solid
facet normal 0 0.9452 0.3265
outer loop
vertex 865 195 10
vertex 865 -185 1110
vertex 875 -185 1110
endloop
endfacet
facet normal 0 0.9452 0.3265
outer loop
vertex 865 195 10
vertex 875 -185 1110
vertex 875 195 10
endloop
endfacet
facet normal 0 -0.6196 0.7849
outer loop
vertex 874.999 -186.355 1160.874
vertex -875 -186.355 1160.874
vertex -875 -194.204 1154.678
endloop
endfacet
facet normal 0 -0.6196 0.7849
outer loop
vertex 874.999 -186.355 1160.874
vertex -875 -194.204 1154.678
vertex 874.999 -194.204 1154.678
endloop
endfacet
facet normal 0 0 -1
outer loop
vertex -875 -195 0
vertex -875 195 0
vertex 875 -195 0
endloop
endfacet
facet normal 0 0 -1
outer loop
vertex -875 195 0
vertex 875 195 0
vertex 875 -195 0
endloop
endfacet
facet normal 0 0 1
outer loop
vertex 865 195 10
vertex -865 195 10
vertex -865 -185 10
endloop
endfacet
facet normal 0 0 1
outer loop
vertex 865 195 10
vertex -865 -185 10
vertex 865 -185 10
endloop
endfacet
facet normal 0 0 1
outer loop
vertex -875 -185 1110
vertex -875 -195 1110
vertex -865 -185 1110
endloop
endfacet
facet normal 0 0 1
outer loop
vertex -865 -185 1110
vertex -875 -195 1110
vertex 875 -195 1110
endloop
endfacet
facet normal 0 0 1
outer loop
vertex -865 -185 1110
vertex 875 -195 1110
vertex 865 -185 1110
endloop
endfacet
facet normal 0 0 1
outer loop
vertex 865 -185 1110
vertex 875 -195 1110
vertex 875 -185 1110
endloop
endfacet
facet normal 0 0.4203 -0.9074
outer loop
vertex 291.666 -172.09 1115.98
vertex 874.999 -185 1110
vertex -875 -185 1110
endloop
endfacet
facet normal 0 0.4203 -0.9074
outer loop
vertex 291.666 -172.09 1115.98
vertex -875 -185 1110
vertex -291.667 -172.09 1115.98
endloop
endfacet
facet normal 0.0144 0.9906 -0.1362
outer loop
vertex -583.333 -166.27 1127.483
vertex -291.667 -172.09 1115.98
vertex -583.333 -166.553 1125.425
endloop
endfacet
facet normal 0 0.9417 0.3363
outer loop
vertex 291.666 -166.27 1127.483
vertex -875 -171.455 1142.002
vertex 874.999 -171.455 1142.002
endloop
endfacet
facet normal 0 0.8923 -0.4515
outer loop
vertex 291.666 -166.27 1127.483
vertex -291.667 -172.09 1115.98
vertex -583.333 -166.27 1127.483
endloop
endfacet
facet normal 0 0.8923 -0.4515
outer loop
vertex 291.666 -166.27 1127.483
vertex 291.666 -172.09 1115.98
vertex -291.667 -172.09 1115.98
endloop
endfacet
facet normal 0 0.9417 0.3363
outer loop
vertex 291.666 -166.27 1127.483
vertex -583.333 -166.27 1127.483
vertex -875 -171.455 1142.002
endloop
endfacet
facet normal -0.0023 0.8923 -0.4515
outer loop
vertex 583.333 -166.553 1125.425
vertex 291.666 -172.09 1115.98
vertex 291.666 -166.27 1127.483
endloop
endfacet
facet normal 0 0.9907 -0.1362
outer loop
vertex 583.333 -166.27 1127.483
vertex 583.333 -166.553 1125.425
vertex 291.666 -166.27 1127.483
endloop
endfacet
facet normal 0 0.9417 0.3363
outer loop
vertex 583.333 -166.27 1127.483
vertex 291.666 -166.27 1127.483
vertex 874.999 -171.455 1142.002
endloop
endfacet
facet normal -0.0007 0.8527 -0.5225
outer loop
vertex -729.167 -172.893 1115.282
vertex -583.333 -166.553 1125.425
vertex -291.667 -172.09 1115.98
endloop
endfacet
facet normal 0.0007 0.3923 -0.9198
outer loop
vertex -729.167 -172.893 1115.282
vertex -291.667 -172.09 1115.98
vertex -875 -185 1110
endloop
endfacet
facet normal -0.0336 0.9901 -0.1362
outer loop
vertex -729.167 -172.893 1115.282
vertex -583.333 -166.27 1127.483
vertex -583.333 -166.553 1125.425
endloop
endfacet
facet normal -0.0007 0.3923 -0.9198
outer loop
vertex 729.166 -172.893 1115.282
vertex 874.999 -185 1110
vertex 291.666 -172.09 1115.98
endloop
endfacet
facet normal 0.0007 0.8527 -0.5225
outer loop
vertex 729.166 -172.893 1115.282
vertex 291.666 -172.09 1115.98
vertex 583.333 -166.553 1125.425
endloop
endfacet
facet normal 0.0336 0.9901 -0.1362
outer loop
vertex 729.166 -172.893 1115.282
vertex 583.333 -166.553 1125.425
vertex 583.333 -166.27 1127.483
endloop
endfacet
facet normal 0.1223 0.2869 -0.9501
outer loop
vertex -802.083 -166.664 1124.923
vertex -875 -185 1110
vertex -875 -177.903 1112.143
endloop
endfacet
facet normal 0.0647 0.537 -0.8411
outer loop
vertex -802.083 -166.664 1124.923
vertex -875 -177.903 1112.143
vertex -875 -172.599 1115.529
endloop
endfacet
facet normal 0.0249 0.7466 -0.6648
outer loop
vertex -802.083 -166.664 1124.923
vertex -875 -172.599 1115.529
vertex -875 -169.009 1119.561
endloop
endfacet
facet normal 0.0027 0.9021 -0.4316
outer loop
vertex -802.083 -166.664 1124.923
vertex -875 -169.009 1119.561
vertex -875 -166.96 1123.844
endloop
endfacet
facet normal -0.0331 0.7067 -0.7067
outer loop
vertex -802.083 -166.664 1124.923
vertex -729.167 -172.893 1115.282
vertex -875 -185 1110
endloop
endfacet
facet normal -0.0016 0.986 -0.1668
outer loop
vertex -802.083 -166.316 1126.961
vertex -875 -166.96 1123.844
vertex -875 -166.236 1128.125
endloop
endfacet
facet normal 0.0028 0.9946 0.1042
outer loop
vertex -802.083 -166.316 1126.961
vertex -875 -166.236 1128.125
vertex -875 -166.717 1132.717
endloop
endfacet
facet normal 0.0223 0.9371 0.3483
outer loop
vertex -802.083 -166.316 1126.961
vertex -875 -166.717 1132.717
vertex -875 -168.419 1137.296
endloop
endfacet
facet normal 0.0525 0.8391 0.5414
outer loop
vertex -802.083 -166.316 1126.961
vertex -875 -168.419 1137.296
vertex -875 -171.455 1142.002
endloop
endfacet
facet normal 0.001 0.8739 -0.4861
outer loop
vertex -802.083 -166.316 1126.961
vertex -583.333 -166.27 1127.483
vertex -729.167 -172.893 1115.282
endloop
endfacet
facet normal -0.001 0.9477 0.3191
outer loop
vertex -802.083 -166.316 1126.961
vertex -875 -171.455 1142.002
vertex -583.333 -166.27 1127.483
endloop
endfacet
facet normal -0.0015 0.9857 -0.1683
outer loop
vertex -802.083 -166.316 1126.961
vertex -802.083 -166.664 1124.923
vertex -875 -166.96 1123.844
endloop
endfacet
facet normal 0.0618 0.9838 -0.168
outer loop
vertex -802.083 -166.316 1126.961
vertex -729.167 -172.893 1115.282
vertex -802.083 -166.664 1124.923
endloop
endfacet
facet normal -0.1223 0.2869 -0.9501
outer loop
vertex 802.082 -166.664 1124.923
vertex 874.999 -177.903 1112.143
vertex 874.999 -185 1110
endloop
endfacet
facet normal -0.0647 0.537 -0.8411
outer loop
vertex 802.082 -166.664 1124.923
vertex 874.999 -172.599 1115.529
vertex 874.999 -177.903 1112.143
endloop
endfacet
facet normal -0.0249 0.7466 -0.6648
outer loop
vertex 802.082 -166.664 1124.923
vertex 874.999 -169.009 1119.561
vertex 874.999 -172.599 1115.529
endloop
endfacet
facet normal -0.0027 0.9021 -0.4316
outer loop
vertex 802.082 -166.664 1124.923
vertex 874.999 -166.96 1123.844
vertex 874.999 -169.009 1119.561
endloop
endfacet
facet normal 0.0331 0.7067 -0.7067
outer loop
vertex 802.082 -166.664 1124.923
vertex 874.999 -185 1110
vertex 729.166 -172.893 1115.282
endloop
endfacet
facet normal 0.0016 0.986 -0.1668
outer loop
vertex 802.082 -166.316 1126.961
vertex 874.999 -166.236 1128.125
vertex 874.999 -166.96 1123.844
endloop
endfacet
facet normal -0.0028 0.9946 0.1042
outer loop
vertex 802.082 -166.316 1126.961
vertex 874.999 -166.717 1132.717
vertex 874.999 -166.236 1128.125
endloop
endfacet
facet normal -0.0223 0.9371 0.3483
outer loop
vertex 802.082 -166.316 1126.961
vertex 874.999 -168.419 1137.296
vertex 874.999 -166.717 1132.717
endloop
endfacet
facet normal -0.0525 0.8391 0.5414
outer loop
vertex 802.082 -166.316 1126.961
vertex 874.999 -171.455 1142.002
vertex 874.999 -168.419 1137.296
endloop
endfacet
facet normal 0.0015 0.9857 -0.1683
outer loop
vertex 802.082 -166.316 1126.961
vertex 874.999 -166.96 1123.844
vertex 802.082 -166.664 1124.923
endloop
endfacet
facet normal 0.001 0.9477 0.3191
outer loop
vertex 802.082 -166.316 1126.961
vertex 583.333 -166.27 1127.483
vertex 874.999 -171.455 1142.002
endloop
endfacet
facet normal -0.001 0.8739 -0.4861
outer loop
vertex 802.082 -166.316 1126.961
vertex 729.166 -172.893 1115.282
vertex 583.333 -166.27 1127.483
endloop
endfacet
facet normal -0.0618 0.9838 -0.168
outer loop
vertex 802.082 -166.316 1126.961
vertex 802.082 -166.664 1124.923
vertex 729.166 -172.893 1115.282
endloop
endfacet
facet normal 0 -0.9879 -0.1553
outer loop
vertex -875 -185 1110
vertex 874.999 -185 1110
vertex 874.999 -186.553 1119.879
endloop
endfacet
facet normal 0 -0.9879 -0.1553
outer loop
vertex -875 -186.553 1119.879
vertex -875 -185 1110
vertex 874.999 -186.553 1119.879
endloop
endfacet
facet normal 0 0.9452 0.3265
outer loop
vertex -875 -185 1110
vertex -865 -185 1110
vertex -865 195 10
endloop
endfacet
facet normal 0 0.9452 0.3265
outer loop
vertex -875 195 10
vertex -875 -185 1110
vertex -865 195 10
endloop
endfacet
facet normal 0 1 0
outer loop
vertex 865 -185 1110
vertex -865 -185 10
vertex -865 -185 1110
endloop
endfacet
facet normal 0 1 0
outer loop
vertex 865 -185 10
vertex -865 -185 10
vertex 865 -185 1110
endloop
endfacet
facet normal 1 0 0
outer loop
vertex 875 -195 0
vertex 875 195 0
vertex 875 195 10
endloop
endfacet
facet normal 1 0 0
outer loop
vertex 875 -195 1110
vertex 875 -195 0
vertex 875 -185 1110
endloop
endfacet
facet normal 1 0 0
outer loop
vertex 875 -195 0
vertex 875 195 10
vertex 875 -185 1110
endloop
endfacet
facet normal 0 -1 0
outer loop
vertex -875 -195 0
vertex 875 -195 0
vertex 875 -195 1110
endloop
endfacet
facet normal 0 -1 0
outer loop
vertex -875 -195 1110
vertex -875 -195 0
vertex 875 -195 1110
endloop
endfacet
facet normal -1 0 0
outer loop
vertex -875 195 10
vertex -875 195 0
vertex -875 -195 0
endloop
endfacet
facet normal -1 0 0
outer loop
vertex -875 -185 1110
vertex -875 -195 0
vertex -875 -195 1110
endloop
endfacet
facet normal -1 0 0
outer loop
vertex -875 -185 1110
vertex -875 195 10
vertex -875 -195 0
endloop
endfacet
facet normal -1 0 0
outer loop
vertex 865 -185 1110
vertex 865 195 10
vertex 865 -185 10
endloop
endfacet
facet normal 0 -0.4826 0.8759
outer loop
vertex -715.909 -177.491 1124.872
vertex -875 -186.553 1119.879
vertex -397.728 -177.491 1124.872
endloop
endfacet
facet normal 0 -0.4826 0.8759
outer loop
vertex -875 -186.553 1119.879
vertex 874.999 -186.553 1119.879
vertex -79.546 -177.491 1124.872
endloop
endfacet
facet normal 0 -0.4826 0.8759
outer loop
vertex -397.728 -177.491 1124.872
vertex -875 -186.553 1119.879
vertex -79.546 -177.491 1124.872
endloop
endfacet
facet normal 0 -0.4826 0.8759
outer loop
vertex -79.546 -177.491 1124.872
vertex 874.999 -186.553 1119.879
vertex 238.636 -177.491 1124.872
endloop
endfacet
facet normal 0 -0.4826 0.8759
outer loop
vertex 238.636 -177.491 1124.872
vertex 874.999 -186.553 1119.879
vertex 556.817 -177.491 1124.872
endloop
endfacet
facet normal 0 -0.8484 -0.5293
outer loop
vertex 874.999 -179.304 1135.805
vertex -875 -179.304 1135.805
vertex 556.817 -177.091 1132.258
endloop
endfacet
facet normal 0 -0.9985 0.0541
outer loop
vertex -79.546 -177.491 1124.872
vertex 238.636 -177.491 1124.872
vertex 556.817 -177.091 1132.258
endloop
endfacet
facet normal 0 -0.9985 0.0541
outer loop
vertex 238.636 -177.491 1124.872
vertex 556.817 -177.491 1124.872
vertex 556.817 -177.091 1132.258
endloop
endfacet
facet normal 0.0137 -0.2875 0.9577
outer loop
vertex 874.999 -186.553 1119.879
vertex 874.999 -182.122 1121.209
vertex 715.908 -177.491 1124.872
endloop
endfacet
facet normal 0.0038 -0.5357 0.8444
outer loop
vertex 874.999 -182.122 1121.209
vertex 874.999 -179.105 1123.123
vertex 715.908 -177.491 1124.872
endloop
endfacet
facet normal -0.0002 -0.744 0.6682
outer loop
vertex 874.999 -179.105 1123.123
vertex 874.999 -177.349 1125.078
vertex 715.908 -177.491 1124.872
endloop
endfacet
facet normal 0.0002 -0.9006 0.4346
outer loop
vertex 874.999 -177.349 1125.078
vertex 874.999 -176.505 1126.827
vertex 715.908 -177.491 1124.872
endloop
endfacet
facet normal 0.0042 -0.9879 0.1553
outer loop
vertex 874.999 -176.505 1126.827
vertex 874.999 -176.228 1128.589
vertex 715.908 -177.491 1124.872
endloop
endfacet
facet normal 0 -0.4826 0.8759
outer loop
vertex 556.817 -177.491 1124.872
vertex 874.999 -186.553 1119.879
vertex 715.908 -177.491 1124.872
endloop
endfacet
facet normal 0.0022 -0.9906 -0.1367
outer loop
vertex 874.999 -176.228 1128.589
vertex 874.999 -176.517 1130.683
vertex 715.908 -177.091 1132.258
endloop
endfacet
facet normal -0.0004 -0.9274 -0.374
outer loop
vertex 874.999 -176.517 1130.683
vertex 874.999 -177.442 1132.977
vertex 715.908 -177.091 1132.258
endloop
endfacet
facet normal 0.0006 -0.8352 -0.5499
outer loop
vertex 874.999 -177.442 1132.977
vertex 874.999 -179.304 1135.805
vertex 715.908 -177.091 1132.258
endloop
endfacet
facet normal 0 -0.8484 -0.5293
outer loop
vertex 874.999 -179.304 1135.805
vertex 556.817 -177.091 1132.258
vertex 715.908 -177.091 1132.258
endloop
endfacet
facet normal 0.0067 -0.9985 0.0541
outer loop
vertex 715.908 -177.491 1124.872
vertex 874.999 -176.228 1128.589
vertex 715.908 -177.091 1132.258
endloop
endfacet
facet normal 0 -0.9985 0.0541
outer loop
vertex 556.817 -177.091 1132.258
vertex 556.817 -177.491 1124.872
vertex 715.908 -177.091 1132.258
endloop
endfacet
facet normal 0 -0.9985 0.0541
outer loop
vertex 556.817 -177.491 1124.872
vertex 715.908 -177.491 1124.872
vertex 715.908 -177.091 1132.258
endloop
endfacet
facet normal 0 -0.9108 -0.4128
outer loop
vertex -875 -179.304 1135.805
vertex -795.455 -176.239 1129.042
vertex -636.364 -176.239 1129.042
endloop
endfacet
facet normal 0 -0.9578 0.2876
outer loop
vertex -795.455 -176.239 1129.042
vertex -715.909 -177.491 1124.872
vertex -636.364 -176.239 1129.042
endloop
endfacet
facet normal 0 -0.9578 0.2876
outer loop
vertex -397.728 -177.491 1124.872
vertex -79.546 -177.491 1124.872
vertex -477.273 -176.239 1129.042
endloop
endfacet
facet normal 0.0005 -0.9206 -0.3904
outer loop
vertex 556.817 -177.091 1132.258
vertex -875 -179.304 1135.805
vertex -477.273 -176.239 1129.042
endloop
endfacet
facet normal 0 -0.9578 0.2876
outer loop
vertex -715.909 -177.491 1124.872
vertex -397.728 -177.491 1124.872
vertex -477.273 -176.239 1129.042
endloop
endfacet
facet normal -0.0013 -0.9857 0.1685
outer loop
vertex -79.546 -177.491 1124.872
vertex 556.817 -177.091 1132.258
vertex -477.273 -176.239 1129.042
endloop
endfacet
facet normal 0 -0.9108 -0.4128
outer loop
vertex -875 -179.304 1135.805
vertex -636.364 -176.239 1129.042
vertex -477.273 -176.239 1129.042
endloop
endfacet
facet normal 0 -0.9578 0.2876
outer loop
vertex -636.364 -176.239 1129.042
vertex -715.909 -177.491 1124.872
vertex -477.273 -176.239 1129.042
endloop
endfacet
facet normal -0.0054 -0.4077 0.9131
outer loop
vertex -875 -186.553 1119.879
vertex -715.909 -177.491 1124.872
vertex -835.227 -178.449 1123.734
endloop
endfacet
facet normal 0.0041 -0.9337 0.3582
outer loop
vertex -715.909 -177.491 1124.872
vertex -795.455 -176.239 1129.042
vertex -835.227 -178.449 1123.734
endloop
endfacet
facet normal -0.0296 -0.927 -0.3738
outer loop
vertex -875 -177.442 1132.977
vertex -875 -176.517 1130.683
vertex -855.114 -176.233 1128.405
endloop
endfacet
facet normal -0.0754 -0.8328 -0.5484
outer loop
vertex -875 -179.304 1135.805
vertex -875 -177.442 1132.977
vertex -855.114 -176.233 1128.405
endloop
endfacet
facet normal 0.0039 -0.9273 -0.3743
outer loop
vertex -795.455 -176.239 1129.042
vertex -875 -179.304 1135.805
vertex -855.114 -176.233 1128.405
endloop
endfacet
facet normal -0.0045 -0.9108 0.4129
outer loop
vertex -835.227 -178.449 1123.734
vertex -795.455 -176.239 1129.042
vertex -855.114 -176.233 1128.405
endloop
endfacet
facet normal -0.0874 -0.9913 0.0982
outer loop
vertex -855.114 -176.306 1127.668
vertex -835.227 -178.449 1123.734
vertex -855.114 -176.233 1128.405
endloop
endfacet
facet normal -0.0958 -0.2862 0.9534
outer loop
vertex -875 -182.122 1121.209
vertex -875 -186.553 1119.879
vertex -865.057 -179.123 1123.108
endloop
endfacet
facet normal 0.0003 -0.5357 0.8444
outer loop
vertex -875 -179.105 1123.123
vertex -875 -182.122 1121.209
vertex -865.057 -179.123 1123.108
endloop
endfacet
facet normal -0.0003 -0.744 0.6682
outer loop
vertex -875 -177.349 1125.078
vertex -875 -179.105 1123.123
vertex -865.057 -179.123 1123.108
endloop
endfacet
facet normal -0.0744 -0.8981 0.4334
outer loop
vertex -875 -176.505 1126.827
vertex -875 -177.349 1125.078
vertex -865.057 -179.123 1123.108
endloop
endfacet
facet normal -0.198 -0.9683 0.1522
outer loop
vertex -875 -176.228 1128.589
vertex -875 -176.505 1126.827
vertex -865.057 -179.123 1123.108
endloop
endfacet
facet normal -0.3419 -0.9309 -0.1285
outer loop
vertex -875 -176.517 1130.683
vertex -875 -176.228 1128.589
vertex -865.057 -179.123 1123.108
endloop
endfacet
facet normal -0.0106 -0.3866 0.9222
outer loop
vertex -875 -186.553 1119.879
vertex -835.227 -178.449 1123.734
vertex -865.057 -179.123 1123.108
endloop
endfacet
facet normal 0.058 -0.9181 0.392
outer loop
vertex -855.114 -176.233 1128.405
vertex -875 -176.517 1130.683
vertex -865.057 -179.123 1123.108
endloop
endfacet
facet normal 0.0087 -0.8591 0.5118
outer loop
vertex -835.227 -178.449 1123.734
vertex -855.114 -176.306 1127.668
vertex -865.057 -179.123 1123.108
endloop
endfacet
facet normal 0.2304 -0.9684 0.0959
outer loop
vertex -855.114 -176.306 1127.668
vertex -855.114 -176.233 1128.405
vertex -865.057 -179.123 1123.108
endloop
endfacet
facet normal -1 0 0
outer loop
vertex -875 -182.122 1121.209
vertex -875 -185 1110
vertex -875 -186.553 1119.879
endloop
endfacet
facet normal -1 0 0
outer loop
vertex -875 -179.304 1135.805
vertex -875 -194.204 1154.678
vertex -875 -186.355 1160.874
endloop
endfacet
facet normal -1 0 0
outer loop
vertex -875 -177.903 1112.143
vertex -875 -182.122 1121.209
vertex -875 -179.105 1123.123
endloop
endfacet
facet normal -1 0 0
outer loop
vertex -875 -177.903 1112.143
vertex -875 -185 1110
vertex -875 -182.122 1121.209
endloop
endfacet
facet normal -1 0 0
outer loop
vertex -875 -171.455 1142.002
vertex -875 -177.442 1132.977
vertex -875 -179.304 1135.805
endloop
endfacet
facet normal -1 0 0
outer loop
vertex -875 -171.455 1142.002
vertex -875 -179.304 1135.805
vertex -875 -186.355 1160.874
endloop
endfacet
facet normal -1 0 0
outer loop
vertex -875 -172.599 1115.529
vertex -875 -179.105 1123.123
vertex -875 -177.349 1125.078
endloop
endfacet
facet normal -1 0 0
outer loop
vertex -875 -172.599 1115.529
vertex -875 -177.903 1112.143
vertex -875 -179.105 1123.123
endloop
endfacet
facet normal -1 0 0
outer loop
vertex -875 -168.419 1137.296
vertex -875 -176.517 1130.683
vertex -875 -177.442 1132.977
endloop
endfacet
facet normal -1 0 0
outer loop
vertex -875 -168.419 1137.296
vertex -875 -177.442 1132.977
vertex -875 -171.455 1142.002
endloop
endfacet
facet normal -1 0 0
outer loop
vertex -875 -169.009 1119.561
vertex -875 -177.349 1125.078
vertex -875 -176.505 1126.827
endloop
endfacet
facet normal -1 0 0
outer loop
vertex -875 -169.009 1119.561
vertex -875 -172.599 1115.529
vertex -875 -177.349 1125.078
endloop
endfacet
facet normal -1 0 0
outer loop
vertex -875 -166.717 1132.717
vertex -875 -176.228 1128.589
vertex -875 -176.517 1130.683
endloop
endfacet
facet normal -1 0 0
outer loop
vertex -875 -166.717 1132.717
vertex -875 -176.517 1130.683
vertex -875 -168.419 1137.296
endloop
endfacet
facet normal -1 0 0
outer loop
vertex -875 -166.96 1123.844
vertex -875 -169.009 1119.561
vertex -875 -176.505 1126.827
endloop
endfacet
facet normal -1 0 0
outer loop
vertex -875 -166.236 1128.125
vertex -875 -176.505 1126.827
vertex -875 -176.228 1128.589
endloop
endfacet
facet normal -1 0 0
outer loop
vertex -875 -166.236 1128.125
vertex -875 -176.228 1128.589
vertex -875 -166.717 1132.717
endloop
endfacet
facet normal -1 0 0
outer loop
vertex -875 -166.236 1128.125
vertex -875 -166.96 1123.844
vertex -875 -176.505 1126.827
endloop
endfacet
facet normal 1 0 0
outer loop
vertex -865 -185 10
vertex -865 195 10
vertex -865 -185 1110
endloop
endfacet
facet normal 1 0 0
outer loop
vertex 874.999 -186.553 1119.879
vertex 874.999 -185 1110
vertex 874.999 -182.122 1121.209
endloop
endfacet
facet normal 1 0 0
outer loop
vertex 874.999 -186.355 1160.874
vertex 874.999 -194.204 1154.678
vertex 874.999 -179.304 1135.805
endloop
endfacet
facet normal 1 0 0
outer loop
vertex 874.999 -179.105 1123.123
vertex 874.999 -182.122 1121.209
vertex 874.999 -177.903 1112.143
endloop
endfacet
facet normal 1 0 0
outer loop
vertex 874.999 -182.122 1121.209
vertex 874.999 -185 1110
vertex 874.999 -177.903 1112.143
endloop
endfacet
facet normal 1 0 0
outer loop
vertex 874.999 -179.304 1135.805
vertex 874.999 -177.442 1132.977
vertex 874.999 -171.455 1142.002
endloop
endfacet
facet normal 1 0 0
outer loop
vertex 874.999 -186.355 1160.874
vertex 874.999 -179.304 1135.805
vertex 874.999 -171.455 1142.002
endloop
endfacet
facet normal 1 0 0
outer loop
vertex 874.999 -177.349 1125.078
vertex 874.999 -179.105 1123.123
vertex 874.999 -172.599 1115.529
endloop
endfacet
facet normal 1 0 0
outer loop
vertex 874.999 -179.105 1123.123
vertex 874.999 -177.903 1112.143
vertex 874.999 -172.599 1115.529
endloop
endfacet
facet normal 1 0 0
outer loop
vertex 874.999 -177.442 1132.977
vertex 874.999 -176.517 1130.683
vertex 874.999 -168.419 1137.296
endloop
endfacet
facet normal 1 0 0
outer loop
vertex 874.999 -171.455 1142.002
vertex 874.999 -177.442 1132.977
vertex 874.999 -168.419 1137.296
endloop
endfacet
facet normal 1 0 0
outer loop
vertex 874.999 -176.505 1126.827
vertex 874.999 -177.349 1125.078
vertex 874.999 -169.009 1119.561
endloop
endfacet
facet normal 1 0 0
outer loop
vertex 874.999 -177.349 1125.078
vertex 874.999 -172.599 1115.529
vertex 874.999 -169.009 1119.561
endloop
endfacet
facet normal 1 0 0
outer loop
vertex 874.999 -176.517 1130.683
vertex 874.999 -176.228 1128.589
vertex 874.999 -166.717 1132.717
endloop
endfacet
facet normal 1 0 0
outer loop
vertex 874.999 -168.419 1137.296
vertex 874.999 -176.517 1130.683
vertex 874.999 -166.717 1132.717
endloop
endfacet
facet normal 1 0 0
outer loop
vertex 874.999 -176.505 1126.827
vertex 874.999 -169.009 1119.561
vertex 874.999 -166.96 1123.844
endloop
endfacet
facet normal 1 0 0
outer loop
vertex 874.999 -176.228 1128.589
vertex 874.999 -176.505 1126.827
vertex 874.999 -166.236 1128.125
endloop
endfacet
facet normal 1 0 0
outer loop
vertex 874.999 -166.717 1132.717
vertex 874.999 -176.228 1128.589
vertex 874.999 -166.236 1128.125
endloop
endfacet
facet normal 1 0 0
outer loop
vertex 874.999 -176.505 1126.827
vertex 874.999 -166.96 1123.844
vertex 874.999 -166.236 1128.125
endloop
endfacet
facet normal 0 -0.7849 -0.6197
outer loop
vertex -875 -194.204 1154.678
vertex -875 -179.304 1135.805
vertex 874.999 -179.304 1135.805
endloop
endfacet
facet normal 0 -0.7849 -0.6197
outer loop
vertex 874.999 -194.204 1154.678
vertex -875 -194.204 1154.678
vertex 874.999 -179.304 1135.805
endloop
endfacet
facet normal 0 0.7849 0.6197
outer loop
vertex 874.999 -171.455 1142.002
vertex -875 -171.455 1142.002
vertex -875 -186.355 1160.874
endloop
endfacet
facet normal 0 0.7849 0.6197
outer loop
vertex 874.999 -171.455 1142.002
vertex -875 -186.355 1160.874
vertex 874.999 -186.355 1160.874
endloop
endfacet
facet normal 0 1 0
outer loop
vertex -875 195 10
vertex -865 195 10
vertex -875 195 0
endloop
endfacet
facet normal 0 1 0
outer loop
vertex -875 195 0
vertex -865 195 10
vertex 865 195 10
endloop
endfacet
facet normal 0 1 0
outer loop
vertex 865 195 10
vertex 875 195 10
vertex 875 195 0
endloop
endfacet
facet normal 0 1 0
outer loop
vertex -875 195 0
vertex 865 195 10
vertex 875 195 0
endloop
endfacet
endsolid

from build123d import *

# Parameters (mm, degrees)
SKETCH1_W           = 1730
SKETCH1_H           = 390
BOSS_EXTRUDE1_DEPTH = 10
SKETCH2_W           = 1730
SKETCH2_H           = 10
BOSS_EXTRUDE2_DEPTH = 1100
BOSS_EXTRUDE3_DEPTH = 10
EXTRUDE_THIN4_START = -9.999030268
EXTRUDE_THIN4_DEPTH = 1749.999030268
SKETCH7_W           = 1749.999030268
SKETCH7_H           = 10
BOSS_EXTRUDE5_DEPTH = 24.044878722


# Read off the part's stored shape, not the designer's step: Extrude-Thin4
with BuildPart() as part:
    # Sketch1 → Boss-Extrude1 (new body)
    with BuildSketch(Plane.XY):
        Rectangle(SKETCH1_W, SKETCH1_H)
    extrude(amount=BOSS_EXTRUDE1_DEPTH)

    # Sketch2 → Boss-Extrude2 (add)
    with BuildSketch(Plane.XY.offset(10)):
        with Locations((0, -190)):
            Rectangle(SKETCH2_W, SKETCH2_H)
    extrude(amount=BOSS_EXTRUDE2_DEPTH)

    # Sketch3 → Boss-Extrude3 (add)
    with BuildSketch(Plane(origin=(865, 0, 0), x_dir=(0, 0, -1), z_dir=(1, 0, 0))):
        Polygon((-1110, -185), (-10, 195), (0, 195), (0, -195), (-1110, -195), align=None)
    boss_extrude3 = extrude(amount=BOSS_EXTRUDE3_DEPTH)

    # Mirror1: Boss-Extrude3 across plane
    add(boss_extrude3.mirror(Plane(origin=(0, 0, 0), x_dir=(0, 0, 1), z_dir=(1, 0, 0))))


with BuildPart() as body_2:
    # Extrude-Thin4 outline → Extrude-Thin4 (new body)
    with BuildSketch(Plane.ZY.offset(-865).offset(EXTRUDE_THIN4_START)):
        with BuildLine():
            Line((1110, -185), (1119.878664077, -186.553060223))
            add(Edge.make_bspline(
                [(1119.878664077, -186.553060223), (1120.06973986, -185.337670476), (1120.379416846, -184.188767651), (1121.180226007, -182.08832069), (1121.671356856, -181.137567773), (1122.759100406, -179.489339069), (1123.354788202, -178.792882476), (1124.565853221, -177.671721163), (1125.178648954, -177.246987467), (1126.078975873, -176.782949501), (1126.376570147, -176.656608706), (1126.972563894, -176.453314873), (1127.270992066, -176.376195381), (1127.883195991, -176.267470575), (1128.197126391, -176.235735176), (1128.861010901, -176.222372807), (1129.211185828, -176.240740953), (1129.968413198, -176.342967966), (1130.375633591, -176.426954176), (1131.261690179, -176.684670954), (1131.740567554, -176.85857696), (1133.292558686, -177.557226078), (1134.483913132, -178.261229015), (1135.8051123, -179.30428099)],
                knots=[0, 0, 0, 0, 0.125, 0.125, 0.25, 0.25, 0.375, 0.375, 0.5, 0.5, 0.5625, 0.5625, 0.625, 0.625, 0.6875, 0.6875, 0.75, 0.75, 0.8125, 0.8125, 0.875, 0.875, 1, 1, 1, 1], degree=3))
            Line((1135.8051123, -179.30428099), (1142.001555186, -171.455453334))
            add(Edge.make_bspline(
                [(1110, -185), (1112.38195229, -169.848941357), (1126.810813816, -159.462762779), (1142.001555186, -171.455453334)],
                knots=[0, 0, 0, 0, 1, 1, 1, 1], degree=3))
        make_face()
    extrude(amount=EXTRUDE_THIN4_DEPTH)

    # Sketch7 → Boss-Extrude5 (add)
    with BuildSketch(Plane(origin=(0, -621.24218469, 786.906767274), x_dir=(1, 0, 0), z_dir=(0, -0.6196442885790174, 0.7848827655334288))):
        with Locations((-0.000484866, 568.06231084)):
            Rectangle(SKETCH7_W, SKETCH7_H)
    extrude(amount=BOSS_EXTRUDE5_DEPTH)


solid = Compound([part.part, body_2.part])
